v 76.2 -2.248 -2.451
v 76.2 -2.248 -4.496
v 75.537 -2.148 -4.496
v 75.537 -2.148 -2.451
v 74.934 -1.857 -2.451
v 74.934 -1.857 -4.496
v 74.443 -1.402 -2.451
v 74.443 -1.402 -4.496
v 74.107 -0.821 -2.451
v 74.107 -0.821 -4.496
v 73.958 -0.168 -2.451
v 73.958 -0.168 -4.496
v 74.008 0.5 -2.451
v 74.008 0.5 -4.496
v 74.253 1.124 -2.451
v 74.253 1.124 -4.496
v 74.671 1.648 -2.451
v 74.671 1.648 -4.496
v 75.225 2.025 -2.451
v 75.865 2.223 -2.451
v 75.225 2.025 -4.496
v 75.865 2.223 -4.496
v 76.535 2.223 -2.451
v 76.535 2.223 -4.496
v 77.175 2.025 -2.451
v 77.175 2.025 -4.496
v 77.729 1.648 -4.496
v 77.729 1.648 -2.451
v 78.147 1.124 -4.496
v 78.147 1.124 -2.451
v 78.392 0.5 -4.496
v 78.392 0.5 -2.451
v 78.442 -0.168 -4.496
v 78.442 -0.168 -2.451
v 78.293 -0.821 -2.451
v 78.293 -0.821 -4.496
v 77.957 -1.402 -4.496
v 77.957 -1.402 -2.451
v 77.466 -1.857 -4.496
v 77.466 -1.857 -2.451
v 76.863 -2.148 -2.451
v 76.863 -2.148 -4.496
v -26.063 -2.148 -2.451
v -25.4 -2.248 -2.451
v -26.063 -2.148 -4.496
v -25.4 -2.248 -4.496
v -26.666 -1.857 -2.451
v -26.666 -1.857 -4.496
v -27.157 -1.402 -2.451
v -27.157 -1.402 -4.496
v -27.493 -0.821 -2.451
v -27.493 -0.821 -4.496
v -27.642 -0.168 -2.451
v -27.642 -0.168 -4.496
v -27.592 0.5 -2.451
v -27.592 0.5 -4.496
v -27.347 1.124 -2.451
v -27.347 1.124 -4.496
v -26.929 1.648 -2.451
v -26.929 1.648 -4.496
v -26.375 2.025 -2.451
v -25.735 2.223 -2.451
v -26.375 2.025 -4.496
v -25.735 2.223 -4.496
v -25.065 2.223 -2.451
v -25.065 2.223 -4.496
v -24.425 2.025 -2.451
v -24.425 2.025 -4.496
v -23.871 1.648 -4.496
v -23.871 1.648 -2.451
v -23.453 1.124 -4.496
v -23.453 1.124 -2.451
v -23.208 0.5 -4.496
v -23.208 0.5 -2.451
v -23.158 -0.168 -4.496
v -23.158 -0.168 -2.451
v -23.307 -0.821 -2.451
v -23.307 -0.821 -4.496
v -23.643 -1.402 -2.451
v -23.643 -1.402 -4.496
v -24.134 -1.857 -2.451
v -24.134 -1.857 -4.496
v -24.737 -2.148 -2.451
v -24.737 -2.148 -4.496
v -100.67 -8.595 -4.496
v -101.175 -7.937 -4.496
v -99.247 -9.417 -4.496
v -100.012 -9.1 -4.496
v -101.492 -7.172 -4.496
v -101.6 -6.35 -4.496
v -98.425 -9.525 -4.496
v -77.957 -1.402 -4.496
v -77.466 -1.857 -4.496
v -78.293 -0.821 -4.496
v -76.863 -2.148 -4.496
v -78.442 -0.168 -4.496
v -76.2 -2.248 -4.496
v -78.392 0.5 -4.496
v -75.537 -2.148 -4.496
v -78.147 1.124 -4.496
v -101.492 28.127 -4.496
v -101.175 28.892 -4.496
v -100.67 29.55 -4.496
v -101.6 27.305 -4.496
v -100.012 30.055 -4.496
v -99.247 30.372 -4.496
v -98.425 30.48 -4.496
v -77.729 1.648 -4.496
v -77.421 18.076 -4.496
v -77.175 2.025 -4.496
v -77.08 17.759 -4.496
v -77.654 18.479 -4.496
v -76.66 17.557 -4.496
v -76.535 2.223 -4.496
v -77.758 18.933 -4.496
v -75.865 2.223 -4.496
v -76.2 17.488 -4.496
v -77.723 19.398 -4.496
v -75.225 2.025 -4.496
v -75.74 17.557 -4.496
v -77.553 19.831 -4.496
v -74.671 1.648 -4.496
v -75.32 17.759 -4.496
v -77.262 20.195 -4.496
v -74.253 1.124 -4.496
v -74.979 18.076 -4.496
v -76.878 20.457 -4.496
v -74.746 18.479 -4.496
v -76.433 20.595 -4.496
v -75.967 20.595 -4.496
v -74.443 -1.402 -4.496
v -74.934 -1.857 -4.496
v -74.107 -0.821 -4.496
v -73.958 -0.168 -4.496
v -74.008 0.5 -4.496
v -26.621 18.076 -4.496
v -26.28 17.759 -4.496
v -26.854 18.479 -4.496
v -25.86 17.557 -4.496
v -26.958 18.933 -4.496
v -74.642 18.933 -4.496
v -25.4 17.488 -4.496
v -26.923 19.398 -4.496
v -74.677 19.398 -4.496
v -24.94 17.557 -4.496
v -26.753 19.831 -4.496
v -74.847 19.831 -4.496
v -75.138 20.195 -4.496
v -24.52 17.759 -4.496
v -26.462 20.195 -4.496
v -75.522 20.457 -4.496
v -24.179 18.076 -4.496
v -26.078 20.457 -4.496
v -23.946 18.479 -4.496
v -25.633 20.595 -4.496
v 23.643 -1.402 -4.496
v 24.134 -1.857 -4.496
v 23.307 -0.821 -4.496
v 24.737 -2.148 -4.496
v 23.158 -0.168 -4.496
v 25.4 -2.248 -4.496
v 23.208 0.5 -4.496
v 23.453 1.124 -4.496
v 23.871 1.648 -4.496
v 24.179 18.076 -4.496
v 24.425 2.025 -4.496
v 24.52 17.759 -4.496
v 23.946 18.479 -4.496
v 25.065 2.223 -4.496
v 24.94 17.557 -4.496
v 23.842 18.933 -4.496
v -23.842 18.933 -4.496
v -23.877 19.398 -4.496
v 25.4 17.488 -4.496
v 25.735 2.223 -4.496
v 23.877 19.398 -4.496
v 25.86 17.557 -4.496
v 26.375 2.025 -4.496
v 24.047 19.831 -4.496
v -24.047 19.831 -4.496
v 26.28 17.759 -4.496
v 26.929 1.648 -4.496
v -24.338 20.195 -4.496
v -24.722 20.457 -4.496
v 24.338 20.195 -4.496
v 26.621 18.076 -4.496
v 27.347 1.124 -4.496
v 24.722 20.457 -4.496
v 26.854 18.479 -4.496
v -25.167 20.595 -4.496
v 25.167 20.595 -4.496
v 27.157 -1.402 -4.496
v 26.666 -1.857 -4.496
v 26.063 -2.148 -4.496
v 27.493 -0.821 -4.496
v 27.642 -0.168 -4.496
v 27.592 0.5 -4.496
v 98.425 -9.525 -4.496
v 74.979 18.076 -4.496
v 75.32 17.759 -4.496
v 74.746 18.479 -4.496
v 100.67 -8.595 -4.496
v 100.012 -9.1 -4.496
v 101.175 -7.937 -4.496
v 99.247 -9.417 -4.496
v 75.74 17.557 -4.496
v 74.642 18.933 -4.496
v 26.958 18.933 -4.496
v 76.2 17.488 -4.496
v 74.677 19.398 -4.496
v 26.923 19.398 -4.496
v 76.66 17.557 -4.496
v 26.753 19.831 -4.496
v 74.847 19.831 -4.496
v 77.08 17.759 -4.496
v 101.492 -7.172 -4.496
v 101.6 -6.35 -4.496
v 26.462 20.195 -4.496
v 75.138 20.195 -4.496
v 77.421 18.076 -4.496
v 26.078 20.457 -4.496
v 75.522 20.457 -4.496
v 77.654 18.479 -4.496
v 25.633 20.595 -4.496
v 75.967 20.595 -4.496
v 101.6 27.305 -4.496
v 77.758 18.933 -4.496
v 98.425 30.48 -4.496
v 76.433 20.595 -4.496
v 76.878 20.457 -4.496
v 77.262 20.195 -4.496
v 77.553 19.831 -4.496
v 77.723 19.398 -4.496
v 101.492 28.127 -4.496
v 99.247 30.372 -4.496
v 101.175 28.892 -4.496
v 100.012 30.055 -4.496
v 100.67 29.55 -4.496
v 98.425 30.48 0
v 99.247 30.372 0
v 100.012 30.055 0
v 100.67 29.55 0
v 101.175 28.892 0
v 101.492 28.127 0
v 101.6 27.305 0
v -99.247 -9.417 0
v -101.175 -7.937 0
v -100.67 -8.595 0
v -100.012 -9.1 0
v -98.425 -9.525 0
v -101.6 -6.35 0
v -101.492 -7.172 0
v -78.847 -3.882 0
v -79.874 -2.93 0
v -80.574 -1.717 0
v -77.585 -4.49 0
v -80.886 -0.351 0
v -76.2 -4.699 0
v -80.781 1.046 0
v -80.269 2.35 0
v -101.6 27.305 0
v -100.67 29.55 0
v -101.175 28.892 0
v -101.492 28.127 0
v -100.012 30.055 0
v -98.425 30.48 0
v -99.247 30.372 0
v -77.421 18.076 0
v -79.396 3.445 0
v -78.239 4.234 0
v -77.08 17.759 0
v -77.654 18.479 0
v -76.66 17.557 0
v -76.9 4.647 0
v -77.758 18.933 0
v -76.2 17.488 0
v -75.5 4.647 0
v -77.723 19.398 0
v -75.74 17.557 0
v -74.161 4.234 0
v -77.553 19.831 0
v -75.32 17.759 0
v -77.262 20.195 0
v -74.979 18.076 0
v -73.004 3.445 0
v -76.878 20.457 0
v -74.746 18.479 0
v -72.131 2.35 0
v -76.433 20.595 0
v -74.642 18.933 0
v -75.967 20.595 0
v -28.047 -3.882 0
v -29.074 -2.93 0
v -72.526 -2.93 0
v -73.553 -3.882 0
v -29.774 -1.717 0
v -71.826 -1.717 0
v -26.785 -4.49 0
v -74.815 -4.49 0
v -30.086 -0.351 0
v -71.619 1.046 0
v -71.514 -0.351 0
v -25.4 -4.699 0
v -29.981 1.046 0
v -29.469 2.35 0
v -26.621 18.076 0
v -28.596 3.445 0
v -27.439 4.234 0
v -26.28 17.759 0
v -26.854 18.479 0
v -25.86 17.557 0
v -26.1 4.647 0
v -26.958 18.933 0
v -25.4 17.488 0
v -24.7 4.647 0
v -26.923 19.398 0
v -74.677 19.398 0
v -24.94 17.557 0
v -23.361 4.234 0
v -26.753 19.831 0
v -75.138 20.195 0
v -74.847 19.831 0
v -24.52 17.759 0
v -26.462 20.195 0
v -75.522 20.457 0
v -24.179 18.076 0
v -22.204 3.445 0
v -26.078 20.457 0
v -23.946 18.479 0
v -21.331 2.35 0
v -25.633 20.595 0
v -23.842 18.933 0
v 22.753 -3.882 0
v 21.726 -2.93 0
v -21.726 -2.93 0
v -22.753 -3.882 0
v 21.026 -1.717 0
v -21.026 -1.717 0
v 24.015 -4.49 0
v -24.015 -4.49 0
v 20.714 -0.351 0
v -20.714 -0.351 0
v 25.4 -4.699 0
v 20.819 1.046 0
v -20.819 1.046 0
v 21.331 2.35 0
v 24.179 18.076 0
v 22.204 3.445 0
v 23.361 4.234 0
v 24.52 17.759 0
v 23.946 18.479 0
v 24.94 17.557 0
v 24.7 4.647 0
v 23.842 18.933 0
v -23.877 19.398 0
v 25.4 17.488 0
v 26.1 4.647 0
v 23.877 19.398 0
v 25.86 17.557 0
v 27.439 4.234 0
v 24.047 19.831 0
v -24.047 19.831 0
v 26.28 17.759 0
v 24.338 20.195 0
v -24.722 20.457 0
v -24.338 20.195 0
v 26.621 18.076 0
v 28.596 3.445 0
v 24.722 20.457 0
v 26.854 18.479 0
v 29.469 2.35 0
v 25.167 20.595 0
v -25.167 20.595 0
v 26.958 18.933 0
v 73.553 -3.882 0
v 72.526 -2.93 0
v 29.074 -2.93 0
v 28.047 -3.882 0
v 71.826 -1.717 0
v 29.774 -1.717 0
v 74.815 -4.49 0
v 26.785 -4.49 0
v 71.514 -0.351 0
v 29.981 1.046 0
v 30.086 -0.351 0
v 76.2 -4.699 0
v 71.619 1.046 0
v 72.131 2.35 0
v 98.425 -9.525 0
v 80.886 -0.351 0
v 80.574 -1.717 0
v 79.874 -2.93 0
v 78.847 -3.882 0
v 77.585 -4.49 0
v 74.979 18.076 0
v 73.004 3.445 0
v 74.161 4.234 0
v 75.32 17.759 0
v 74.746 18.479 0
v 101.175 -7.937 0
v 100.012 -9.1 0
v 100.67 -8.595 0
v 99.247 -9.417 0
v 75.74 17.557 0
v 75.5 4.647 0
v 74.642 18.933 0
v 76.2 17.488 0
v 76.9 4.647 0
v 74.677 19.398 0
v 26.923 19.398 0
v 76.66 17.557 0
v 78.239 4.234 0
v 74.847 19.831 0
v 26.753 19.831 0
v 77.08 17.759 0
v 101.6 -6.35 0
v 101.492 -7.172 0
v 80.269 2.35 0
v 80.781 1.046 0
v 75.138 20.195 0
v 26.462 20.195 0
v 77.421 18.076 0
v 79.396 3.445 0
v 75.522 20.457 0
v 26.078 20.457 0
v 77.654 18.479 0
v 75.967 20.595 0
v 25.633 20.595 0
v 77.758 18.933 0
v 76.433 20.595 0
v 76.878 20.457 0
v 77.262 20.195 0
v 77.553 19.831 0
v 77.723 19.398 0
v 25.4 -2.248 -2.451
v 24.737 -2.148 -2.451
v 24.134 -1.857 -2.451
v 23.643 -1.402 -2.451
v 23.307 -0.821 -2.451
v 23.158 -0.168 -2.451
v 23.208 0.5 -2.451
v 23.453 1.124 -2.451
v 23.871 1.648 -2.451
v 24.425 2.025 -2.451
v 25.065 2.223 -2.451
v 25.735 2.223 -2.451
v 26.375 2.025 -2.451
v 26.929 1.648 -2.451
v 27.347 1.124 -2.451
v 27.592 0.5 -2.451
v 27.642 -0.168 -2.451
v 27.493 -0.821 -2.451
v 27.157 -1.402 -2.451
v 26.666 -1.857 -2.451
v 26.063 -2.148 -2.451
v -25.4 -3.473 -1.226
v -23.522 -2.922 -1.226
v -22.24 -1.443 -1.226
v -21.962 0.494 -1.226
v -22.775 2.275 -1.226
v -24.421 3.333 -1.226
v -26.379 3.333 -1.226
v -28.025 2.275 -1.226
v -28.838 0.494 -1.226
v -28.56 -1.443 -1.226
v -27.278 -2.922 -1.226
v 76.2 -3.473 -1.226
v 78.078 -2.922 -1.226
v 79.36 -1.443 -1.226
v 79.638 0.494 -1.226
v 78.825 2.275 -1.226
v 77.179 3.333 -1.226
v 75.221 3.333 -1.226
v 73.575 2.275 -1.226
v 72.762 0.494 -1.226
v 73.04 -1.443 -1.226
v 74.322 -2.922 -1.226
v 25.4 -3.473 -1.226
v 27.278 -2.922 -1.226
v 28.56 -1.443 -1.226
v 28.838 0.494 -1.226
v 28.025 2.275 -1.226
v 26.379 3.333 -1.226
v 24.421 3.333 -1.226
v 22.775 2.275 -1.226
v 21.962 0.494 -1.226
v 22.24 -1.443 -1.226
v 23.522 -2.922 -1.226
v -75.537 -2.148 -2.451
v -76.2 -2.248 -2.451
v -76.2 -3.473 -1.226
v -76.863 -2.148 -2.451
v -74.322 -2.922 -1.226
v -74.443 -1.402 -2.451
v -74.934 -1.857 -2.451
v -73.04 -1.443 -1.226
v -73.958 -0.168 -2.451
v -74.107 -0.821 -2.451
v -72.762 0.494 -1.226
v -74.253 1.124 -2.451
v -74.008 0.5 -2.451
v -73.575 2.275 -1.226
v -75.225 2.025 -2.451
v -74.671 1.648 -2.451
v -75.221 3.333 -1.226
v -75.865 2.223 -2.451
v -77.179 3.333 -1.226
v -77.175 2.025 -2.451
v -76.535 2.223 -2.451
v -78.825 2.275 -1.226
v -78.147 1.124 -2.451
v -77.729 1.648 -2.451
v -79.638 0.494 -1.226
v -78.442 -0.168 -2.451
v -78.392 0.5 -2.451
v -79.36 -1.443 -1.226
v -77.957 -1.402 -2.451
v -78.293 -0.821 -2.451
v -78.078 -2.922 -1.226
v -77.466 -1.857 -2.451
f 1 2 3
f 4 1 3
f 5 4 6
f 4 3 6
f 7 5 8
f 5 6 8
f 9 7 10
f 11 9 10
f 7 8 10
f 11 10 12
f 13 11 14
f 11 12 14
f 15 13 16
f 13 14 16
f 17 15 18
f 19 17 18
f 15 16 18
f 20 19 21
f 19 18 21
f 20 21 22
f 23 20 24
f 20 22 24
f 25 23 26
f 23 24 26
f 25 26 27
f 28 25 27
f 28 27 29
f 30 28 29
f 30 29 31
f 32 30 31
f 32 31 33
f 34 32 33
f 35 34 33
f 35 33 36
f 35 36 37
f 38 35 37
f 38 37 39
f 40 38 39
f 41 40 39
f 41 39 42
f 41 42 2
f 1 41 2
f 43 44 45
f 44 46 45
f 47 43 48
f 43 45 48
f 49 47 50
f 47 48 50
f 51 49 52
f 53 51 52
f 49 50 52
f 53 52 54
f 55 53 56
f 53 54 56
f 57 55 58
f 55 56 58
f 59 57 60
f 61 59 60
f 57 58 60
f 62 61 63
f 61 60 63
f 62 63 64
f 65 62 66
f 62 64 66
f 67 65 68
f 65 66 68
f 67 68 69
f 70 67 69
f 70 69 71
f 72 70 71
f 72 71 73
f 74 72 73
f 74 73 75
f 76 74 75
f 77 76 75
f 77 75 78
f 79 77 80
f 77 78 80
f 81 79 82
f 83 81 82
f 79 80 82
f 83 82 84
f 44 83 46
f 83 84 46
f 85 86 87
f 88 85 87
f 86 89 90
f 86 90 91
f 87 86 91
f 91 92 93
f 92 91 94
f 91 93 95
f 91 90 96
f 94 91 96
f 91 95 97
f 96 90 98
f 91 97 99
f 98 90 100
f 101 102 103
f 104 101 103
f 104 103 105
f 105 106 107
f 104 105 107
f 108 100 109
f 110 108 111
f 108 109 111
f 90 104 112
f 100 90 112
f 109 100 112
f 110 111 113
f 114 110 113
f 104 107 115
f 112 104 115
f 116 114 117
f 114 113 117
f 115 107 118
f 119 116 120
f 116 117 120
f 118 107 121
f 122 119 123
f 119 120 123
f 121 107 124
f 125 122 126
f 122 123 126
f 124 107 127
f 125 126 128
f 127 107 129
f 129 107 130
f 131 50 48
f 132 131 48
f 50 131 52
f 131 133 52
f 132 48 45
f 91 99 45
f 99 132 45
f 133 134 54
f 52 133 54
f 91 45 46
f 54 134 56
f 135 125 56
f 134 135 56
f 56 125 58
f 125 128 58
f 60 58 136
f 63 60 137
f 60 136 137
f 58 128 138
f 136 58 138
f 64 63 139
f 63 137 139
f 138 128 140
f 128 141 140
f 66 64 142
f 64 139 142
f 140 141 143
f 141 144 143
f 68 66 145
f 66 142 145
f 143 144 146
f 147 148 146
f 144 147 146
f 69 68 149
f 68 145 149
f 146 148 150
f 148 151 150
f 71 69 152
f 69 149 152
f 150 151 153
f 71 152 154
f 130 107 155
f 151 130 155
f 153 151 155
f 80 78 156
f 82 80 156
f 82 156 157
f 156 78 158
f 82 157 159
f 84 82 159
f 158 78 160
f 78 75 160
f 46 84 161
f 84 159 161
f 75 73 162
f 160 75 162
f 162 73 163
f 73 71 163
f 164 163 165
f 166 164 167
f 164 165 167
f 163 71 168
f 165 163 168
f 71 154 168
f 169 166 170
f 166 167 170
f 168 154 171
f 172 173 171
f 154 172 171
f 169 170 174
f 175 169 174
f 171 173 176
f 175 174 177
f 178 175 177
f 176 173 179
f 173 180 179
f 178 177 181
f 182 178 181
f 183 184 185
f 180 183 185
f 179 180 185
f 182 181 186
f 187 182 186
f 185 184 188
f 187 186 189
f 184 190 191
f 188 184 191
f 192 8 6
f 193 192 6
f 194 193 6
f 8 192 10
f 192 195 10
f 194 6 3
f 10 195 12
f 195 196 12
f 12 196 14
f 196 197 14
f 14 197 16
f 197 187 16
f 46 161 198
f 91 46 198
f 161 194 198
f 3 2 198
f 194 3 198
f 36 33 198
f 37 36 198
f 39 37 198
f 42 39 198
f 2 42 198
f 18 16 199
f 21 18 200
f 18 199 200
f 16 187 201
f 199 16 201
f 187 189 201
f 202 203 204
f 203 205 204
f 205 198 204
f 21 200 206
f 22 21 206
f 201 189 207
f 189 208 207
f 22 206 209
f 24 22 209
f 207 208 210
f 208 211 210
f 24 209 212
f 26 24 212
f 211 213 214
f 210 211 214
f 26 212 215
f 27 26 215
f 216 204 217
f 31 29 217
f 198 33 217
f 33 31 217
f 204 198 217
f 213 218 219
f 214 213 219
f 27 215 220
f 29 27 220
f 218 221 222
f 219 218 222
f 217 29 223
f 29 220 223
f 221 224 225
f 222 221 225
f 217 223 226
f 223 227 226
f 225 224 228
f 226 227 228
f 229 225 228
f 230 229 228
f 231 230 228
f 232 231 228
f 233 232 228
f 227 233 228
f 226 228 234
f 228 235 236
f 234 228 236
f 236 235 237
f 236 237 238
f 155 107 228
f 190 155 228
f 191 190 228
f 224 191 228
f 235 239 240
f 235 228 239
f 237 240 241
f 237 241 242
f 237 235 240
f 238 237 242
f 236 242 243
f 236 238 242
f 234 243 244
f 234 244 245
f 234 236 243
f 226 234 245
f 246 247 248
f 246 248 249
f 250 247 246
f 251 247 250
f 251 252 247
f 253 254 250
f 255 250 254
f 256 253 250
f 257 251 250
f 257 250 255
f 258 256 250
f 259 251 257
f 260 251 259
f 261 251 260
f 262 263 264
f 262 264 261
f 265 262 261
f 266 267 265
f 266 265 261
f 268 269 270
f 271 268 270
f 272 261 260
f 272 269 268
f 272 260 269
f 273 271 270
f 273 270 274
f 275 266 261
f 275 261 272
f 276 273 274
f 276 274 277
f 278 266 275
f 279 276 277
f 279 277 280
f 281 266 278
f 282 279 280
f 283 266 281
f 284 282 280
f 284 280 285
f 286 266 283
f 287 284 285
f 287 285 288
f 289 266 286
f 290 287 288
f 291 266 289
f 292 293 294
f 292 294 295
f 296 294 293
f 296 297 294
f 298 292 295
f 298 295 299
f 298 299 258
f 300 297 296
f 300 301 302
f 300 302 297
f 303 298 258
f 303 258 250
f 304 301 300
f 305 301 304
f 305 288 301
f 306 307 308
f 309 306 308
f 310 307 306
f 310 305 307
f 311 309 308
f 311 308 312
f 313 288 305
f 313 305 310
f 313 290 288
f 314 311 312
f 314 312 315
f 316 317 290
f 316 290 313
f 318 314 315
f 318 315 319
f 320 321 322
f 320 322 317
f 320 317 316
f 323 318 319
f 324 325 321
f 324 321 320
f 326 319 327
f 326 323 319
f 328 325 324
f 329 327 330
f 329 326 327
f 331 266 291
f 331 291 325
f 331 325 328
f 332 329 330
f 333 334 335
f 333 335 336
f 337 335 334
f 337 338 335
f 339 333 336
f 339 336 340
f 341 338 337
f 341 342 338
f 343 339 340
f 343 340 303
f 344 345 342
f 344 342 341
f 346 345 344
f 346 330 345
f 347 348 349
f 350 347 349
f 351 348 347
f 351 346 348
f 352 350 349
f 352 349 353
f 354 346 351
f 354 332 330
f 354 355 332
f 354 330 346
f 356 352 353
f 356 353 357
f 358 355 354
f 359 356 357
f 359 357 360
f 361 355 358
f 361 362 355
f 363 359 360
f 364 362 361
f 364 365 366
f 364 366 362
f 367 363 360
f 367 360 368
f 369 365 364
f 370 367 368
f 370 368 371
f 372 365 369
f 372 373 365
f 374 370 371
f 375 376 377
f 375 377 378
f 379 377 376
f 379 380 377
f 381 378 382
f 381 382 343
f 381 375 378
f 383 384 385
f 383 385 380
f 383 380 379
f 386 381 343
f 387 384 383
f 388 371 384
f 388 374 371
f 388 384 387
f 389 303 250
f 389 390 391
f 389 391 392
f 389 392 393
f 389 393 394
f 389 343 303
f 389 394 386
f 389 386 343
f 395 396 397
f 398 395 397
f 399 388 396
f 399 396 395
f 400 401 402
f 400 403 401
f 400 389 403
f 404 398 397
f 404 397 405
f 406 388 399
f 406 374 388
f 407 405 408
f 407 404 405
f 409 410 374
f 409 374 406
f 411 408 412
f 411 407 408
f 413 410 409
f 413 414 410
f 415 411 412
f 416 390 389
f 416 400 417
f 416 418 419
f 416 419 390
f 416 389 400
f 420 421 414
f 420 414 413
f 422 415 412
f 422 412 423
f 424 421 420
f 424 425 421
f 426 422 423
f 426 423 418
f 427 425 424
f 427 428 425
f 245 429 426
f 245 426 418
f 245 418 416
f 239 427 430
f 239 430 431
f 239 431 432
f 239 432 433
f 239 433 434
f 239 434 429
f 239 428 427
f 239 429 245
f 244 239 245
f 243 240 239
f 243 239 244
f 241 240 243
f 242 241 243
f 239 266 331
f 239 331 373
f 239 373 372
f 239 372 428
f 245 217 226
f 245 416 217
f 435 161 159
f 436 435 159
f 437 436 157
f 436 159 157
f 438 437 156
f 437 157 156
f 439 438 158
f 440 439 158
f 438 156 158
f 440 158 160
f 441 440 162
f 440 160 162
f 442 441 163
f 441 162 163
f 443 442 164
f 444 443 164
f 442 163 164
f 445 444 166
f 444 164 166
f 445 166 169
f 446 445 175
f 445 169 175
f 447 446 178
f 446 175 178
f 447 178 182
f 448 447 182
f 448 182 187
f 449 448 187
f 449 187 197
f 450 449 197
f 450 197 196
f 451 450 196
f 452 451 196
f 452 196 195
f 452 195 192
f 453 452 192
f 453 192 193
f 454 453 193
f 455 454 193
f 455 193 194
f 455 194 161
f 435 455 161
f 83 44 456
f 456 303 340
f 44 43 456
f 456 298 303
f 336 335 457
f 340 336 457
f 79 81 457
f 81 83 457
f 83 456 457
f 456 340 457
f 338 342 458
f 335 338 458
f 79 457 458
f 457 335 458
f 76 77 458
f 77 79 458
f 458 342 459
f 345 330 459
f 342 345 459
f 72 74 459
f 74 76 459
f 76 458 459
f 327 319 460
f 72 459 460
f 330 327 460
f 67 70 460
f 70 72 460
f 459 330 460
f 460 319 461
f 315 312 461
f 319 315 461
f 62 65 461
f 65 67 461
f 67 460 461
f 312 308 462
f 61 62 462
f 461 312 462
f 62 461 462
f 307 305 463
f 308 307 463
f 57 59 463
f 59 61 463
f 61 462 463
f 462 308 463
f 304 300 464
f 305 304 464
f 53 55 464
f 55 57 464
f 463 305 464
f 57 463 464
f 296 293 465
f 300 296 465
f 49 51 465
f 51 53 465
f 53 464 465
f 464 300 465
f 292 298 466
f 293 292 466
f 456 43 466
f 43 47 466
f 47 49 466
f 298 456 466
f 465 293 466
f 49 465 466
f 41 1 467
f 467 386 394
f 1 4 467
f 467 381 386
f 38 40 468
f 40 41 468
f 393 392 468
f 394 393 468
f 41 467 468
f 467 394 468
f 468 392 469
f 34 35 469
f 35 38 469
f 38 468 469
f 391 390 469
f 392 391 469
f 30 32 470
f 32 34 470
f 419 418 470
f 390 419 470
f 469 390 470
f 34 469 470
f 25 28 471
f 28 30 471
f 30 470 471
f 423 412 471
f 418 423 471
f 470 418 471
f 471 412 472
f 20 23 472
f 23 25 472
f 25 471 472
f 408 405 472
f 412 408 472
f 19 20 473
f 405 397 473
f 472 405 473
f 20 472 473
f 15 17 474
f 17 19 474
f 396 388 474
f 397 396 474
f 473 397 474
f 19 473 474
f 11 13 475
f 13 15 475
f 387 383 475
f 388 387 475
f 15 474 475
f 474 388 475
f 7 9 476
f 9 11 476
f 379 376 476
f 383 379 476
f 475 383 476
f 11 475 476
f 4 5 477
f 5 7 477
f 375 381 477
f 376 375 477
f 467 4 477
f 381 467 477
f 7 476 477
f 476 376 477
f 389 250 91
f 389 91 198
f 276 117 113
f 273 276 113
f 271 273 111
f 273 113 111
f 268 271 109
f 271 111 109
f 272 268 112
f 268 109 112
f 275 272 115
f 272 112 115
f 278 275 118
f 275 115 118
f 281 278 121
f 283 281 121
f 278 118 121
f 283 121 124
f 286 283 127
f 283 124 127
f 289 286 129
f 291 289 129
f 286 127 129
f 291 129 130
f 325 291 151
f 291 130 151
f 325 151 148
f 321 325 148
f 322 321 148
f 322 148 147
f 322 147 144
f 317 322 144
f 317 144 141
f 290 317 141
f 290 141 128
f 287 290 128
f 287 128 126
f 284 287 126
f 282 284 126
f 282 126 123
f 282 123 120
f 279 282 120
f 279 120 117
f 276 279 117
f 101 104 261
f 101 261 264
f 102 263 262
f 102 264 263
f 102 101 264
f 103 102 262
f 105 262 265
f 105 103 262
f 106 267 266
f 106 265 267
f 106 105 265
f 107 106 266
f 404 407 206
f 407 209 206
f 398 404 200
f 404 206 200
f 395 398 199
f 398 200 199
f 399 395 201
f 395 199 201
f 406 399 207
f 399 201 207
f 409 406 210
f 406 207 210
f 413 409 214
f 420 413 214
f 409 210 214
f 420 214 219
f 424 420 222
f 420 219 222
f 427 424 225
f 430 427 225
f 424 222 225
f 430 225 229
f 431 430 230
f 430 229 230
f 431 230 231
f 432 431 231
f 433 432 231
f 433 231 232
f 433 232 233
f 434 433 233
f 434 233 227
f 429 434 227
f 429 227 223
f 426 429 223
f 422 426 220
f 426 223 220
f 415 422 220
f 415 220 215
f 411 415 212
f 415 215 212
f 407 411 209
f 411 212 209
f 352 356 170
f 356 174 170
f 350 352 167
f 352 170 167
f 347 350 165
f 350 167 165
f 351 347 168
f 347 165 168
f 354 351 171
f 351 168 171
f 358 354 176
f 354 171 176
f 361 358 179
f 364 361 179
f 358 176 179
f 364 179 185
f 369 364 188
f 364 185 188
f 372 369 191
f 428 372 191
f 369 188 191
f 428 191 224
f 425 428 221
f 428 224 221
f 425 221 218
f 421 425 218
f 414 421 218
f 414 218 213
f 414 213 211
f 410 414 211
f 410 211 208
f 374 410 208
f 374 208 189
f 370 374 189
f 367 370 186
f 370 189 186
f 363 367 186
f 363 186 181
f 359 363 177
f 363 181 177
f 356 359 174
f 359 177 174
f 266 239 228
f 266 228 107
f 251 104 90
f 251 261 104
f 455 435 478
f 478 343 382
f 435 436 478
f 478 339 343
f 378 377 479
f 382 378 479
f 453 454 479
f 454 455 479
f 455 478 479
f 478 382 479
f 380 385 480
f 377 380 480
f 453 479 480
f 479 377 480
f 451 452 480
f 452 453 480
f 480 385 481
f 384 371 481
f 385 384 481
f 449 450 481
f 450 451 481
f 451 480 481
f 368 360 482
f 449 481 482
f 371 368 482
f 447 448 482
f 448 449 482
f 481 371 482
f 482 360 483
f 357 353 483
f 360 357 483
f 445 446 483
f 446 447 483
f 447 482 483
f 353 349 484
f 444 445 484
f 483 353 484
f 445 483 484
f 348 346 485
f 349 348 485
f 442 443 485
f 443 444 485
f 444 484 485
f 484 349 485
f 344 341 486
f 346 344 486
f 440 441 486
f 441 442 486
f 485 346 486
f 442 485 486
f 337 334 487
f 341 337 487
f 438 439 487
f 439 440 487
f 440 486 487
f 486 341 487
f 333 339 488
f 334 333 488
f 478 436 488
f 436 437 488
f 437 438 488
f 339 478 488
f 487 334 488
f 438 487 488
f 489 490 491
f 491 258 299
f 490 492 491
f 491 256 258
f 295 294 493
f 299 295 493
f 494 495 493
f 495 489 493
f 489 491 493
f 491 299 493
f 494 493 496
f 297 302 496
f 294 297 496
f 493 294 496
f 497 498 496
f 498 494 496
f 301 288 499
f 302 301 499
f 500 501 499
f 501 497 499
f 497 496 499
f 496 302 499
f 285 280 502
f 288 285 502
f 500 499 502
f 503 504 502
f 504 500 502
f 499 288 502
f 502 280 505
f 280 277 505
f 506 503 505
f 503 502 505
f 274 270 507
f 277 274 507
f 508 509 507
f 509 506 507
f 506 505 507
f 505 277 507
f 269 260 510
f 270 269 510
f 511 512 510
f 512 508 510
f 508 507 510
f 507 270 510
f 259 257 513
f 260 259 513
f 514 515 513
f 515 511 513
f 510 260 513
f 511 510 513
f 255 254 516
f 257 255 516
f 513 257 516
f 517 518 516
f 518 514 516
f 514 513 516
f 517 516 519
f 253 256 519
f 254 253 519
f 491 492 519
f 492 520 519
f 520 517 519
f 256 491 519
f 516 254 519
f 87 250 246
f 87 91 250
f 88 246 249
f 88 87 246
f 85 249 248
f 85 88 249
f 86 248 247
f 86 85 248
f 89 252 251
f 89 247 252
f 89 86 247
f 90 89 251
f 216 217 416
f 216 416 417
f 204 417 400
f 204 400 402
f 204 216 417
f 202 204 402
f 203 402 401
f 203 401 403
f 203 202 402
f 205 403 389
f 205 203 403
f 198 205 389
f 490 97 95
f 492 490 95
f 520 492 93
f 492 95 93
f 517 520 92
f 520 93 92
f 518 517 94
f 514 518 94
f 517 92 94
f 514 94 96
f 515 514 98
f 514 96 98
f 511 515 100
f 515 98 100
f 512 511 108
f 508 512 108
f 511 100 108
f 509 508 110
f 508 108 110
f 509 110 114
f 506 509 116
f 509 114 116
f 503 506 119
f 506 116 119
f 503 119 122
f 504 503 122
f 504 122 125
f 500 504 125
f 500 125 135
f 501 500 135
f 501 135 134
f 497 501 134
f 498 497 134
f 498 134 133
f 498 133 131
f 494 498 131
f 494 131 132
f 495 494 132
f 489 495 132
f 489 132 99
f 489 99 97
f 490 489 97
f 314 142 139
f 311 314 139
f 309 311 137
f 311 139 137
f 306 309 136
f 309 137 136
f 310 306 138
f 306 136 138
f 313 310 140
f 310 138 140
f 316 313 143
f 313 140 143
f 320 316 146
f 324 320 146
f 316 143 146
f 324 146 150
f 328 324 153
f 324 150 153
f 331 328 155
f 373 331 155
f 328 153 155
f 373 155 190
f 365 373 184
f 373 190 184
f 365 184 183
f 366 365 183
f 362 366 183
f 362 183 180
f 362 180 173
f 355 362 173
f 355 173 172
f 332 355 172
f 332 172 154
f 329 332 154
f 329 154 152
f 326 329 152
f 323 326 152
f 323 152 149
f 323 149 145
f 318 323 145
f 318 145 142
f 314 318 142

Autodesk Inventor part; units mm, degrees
ref_plane "YZ Plane" through (0, 0, 0) normal (1, 0, 0) x (0, 1, 0)
ref_plane "XZ Plane" through (0, 0, 0) normal (0, 1, 0) x (-1, 0, 0)
ref_plane "XY Plane" through (0, 0, 0) normal (0, 0, 1) x (1, 0, 0)
sketch "Sketch1" plane through (0, 0, 0) normal (0, 0, 1) x (1, 0, 0)
  line L0 (0, 38.481) -> (0, -17.526) projected
  line L1 (-142.24, 0) -> (142.24, 0) projected
  line L2 (101.6, 30.48) -> (-101.6, 30.48)
  line L3 (-101.6, 30.48) -> (-101.6, -9.525)
  line L4 (-101.6, -9.525) -> (101.6, -9.525)
  line L5 (101.6, -9.525) -> (101.6, 30.48)
  line L6 (101.6, 30.48) -> (-101.6, -9.525) construction
  line L7 (-101.6, 30.48) -> (101.6, -9.525) construction
  point P0 (0, 0)
  point P1 (0, 10.4775)
  point P2 (-76.2, 0)
  point P3 (-25.4, 0)
  point P4 (25.4, 0)
  point P5 (76.2, 0)
  point P6 (-76.2, 19.05)
  point P7 (-25.4, 19.05)
  point P8 (25.4, 19.05)
  point P9 (76.2, 19.05)
  dimension "d0" = 9.525
  dimension "d1" = 30.48
  dimension "d2" = 203.2
  dimension "d3" = 50.8
  dimension "d4" = 25.4
  dimension "d5" = 25.4
  dimension "d6" = 50.8
  dimension "d11" = 19.05
extrude "Extrusion1" add sketch "Sketch1" against normal blind 4.4958
hole "Hole1" at (-76.2, 0, 0) at (-25.4, 0, 0) at (25.4, 0, 0) at (76.2, 0, 0) direction (0, 0, -1) diameter 4.4958 end through all countersink diameter 9.398 countersink angle 90 clearance for "Flat Head Machine Screw" size "M4" standard "Ansi Metric M Profile"
hole "Hole2" at (-76.2, 19.05, 0) at (-25.4, 19.05, 0) at (25.4, 19.05, 0) at (76.2, 19.05, 0) direction (0, 0, -1) diameter 3.1242 end through all
fillet "Fillet1" radius 3.175 4 edges at (-101.6, 30.48, -2.2479) (101.6, 30.48, -2.2479) (101.6, -9.525, -2.2479) (-101.6, -9.525, -2.2479)
